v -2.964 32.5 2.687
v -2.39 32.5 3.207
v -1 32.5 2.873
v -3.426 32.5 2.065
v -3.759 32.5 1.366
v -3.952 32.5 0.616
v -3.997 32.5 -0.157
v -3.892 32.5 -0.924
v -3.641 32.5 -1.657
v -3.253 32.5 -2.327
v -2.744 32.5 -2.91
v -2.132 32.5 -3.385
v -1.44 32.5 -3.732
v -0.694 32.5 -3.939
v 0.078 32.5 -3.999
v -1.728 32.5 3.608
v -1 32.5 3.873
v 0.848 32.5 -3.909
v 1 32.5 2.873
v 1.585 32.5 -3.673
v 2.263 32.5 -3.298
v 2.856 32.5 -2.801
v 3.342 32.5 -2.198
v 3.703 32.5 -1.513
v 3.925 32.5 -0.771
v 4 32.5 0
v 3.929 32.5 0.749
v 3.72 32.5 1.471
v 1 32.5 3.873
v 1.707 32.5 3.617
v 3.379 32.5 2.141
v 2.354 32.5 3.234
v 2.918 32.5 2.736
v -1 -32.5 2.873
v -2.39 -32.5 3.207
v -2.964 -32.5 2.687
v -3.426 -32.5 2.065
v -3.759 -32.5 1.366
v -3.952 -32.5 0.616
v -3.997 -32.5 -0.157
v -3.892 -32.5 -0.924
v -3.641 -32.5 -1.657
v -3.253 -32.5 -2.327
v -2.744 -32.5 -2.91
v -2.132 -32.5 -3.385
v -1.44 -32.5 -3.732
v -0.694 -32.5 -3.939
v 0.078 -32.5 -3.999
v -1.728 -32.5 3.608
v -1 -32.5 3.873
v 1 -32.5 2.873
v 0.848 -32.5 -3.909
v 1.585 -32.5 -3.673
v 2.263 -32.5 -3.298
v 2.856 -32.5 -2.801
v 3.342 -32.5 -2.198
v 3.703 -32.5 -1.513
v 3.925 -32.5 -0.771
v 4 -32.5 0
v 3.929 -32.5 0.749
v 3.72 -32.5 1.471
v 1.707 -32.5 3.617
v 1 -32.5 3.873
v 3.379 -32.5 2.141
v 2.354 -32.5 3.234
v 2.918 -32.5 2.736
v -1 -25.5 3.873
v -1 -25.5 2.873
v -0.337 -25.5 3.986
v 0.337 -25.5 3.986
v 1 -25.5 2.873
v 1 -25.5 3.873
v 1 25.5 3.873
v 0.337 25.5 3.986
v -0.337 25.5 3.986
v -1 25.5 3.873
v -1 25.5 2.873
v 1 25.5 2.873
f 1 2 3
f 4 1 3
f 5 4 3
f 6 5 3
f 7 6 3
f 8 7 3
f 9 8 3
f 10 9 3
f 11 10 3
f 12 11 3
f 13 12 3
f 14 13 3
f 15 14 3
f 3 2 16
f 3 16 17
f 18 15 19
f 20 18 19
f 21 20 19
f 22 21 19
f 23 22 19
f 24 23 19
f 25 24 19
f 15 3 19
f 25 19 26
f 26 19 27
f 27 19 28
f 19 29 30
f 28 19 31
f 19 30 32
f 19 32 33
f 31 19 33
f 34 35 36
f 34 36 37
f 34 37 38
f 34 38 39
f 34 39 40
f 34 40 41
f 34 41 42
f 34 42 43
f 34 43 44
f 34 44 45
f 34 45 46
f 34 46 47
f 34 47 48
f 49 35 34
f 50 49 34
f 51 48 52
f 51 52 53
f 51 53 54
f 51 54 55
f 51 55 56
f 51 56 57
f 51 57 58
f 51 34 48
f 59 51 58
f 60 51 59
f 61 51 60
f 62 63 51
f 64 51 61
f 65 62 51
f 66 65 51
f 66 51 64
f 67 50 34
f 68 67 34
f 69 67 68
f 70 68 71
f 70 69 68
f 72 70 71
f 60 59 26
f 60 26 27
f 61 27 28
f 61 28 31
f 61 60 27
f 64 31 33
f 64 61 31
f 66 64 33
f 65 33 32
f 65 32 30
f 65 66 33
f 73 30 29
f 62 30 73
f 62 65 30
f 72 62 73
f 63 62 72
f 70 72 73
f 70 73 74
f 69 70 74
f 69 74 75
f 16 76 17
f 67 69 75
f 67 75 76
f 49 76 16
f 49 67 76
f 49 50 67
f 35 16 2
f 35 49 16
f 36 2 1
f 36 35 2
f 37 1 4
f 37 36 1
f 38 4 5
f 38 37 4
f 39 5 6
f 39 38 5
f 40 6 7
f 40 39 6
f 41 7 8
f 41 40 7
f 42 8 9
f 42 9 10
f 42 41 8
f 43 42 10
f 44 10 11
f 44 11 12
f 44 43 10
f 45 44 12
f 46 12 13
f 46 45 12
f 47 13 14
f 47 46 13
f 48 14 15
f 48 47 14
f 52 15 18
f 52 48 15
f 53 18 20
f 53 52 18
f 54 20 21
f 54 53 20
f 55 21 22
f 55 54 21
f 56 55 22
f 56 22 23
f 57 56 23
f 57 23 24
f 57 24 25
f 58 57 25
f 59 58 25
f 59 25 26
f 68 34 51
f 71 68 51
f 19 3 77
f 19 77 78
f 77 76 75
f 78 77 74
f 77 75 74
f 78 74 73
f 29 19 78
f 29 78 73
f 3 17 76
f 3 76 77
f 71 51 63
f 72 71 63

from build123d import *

# Parameters (mm, degrees)
F0_R     = 4
F1_DEPTH = 32.5
F3_DEPTH = 7


# Not quite as in the source:
# - a pattern or mirror of a feature is missing from the dataset's text; its kind, count and spacing are read off the source's solid


with BuildPart() as f1:
    # F0 (on Front) → F1 (new body, symmetric)
    with BuildSketch(Plane.XZ):
        Circle(F0_R)
    extrude(amount=F1_DEPTH, both=True)

    # F2 (on face) → F3 (cut)
    with BuildSketch(Plane.XZ.offset(32.5)):
        Polygon((0, 4.634491168), (-1, 3.8729833462), (-1, 2.8729833462), (1, 2.8729833462), (1, 3.8729833462), align=None)
    f3 = extrude(amount=-F3_DEPTH, mode=Mode.SUBTRACT)

    # F3_copies: F3 across plane
    add(f3.mirror(Plane.ZX), mode=Mode.SUBTRACT)


solid = f1.part
